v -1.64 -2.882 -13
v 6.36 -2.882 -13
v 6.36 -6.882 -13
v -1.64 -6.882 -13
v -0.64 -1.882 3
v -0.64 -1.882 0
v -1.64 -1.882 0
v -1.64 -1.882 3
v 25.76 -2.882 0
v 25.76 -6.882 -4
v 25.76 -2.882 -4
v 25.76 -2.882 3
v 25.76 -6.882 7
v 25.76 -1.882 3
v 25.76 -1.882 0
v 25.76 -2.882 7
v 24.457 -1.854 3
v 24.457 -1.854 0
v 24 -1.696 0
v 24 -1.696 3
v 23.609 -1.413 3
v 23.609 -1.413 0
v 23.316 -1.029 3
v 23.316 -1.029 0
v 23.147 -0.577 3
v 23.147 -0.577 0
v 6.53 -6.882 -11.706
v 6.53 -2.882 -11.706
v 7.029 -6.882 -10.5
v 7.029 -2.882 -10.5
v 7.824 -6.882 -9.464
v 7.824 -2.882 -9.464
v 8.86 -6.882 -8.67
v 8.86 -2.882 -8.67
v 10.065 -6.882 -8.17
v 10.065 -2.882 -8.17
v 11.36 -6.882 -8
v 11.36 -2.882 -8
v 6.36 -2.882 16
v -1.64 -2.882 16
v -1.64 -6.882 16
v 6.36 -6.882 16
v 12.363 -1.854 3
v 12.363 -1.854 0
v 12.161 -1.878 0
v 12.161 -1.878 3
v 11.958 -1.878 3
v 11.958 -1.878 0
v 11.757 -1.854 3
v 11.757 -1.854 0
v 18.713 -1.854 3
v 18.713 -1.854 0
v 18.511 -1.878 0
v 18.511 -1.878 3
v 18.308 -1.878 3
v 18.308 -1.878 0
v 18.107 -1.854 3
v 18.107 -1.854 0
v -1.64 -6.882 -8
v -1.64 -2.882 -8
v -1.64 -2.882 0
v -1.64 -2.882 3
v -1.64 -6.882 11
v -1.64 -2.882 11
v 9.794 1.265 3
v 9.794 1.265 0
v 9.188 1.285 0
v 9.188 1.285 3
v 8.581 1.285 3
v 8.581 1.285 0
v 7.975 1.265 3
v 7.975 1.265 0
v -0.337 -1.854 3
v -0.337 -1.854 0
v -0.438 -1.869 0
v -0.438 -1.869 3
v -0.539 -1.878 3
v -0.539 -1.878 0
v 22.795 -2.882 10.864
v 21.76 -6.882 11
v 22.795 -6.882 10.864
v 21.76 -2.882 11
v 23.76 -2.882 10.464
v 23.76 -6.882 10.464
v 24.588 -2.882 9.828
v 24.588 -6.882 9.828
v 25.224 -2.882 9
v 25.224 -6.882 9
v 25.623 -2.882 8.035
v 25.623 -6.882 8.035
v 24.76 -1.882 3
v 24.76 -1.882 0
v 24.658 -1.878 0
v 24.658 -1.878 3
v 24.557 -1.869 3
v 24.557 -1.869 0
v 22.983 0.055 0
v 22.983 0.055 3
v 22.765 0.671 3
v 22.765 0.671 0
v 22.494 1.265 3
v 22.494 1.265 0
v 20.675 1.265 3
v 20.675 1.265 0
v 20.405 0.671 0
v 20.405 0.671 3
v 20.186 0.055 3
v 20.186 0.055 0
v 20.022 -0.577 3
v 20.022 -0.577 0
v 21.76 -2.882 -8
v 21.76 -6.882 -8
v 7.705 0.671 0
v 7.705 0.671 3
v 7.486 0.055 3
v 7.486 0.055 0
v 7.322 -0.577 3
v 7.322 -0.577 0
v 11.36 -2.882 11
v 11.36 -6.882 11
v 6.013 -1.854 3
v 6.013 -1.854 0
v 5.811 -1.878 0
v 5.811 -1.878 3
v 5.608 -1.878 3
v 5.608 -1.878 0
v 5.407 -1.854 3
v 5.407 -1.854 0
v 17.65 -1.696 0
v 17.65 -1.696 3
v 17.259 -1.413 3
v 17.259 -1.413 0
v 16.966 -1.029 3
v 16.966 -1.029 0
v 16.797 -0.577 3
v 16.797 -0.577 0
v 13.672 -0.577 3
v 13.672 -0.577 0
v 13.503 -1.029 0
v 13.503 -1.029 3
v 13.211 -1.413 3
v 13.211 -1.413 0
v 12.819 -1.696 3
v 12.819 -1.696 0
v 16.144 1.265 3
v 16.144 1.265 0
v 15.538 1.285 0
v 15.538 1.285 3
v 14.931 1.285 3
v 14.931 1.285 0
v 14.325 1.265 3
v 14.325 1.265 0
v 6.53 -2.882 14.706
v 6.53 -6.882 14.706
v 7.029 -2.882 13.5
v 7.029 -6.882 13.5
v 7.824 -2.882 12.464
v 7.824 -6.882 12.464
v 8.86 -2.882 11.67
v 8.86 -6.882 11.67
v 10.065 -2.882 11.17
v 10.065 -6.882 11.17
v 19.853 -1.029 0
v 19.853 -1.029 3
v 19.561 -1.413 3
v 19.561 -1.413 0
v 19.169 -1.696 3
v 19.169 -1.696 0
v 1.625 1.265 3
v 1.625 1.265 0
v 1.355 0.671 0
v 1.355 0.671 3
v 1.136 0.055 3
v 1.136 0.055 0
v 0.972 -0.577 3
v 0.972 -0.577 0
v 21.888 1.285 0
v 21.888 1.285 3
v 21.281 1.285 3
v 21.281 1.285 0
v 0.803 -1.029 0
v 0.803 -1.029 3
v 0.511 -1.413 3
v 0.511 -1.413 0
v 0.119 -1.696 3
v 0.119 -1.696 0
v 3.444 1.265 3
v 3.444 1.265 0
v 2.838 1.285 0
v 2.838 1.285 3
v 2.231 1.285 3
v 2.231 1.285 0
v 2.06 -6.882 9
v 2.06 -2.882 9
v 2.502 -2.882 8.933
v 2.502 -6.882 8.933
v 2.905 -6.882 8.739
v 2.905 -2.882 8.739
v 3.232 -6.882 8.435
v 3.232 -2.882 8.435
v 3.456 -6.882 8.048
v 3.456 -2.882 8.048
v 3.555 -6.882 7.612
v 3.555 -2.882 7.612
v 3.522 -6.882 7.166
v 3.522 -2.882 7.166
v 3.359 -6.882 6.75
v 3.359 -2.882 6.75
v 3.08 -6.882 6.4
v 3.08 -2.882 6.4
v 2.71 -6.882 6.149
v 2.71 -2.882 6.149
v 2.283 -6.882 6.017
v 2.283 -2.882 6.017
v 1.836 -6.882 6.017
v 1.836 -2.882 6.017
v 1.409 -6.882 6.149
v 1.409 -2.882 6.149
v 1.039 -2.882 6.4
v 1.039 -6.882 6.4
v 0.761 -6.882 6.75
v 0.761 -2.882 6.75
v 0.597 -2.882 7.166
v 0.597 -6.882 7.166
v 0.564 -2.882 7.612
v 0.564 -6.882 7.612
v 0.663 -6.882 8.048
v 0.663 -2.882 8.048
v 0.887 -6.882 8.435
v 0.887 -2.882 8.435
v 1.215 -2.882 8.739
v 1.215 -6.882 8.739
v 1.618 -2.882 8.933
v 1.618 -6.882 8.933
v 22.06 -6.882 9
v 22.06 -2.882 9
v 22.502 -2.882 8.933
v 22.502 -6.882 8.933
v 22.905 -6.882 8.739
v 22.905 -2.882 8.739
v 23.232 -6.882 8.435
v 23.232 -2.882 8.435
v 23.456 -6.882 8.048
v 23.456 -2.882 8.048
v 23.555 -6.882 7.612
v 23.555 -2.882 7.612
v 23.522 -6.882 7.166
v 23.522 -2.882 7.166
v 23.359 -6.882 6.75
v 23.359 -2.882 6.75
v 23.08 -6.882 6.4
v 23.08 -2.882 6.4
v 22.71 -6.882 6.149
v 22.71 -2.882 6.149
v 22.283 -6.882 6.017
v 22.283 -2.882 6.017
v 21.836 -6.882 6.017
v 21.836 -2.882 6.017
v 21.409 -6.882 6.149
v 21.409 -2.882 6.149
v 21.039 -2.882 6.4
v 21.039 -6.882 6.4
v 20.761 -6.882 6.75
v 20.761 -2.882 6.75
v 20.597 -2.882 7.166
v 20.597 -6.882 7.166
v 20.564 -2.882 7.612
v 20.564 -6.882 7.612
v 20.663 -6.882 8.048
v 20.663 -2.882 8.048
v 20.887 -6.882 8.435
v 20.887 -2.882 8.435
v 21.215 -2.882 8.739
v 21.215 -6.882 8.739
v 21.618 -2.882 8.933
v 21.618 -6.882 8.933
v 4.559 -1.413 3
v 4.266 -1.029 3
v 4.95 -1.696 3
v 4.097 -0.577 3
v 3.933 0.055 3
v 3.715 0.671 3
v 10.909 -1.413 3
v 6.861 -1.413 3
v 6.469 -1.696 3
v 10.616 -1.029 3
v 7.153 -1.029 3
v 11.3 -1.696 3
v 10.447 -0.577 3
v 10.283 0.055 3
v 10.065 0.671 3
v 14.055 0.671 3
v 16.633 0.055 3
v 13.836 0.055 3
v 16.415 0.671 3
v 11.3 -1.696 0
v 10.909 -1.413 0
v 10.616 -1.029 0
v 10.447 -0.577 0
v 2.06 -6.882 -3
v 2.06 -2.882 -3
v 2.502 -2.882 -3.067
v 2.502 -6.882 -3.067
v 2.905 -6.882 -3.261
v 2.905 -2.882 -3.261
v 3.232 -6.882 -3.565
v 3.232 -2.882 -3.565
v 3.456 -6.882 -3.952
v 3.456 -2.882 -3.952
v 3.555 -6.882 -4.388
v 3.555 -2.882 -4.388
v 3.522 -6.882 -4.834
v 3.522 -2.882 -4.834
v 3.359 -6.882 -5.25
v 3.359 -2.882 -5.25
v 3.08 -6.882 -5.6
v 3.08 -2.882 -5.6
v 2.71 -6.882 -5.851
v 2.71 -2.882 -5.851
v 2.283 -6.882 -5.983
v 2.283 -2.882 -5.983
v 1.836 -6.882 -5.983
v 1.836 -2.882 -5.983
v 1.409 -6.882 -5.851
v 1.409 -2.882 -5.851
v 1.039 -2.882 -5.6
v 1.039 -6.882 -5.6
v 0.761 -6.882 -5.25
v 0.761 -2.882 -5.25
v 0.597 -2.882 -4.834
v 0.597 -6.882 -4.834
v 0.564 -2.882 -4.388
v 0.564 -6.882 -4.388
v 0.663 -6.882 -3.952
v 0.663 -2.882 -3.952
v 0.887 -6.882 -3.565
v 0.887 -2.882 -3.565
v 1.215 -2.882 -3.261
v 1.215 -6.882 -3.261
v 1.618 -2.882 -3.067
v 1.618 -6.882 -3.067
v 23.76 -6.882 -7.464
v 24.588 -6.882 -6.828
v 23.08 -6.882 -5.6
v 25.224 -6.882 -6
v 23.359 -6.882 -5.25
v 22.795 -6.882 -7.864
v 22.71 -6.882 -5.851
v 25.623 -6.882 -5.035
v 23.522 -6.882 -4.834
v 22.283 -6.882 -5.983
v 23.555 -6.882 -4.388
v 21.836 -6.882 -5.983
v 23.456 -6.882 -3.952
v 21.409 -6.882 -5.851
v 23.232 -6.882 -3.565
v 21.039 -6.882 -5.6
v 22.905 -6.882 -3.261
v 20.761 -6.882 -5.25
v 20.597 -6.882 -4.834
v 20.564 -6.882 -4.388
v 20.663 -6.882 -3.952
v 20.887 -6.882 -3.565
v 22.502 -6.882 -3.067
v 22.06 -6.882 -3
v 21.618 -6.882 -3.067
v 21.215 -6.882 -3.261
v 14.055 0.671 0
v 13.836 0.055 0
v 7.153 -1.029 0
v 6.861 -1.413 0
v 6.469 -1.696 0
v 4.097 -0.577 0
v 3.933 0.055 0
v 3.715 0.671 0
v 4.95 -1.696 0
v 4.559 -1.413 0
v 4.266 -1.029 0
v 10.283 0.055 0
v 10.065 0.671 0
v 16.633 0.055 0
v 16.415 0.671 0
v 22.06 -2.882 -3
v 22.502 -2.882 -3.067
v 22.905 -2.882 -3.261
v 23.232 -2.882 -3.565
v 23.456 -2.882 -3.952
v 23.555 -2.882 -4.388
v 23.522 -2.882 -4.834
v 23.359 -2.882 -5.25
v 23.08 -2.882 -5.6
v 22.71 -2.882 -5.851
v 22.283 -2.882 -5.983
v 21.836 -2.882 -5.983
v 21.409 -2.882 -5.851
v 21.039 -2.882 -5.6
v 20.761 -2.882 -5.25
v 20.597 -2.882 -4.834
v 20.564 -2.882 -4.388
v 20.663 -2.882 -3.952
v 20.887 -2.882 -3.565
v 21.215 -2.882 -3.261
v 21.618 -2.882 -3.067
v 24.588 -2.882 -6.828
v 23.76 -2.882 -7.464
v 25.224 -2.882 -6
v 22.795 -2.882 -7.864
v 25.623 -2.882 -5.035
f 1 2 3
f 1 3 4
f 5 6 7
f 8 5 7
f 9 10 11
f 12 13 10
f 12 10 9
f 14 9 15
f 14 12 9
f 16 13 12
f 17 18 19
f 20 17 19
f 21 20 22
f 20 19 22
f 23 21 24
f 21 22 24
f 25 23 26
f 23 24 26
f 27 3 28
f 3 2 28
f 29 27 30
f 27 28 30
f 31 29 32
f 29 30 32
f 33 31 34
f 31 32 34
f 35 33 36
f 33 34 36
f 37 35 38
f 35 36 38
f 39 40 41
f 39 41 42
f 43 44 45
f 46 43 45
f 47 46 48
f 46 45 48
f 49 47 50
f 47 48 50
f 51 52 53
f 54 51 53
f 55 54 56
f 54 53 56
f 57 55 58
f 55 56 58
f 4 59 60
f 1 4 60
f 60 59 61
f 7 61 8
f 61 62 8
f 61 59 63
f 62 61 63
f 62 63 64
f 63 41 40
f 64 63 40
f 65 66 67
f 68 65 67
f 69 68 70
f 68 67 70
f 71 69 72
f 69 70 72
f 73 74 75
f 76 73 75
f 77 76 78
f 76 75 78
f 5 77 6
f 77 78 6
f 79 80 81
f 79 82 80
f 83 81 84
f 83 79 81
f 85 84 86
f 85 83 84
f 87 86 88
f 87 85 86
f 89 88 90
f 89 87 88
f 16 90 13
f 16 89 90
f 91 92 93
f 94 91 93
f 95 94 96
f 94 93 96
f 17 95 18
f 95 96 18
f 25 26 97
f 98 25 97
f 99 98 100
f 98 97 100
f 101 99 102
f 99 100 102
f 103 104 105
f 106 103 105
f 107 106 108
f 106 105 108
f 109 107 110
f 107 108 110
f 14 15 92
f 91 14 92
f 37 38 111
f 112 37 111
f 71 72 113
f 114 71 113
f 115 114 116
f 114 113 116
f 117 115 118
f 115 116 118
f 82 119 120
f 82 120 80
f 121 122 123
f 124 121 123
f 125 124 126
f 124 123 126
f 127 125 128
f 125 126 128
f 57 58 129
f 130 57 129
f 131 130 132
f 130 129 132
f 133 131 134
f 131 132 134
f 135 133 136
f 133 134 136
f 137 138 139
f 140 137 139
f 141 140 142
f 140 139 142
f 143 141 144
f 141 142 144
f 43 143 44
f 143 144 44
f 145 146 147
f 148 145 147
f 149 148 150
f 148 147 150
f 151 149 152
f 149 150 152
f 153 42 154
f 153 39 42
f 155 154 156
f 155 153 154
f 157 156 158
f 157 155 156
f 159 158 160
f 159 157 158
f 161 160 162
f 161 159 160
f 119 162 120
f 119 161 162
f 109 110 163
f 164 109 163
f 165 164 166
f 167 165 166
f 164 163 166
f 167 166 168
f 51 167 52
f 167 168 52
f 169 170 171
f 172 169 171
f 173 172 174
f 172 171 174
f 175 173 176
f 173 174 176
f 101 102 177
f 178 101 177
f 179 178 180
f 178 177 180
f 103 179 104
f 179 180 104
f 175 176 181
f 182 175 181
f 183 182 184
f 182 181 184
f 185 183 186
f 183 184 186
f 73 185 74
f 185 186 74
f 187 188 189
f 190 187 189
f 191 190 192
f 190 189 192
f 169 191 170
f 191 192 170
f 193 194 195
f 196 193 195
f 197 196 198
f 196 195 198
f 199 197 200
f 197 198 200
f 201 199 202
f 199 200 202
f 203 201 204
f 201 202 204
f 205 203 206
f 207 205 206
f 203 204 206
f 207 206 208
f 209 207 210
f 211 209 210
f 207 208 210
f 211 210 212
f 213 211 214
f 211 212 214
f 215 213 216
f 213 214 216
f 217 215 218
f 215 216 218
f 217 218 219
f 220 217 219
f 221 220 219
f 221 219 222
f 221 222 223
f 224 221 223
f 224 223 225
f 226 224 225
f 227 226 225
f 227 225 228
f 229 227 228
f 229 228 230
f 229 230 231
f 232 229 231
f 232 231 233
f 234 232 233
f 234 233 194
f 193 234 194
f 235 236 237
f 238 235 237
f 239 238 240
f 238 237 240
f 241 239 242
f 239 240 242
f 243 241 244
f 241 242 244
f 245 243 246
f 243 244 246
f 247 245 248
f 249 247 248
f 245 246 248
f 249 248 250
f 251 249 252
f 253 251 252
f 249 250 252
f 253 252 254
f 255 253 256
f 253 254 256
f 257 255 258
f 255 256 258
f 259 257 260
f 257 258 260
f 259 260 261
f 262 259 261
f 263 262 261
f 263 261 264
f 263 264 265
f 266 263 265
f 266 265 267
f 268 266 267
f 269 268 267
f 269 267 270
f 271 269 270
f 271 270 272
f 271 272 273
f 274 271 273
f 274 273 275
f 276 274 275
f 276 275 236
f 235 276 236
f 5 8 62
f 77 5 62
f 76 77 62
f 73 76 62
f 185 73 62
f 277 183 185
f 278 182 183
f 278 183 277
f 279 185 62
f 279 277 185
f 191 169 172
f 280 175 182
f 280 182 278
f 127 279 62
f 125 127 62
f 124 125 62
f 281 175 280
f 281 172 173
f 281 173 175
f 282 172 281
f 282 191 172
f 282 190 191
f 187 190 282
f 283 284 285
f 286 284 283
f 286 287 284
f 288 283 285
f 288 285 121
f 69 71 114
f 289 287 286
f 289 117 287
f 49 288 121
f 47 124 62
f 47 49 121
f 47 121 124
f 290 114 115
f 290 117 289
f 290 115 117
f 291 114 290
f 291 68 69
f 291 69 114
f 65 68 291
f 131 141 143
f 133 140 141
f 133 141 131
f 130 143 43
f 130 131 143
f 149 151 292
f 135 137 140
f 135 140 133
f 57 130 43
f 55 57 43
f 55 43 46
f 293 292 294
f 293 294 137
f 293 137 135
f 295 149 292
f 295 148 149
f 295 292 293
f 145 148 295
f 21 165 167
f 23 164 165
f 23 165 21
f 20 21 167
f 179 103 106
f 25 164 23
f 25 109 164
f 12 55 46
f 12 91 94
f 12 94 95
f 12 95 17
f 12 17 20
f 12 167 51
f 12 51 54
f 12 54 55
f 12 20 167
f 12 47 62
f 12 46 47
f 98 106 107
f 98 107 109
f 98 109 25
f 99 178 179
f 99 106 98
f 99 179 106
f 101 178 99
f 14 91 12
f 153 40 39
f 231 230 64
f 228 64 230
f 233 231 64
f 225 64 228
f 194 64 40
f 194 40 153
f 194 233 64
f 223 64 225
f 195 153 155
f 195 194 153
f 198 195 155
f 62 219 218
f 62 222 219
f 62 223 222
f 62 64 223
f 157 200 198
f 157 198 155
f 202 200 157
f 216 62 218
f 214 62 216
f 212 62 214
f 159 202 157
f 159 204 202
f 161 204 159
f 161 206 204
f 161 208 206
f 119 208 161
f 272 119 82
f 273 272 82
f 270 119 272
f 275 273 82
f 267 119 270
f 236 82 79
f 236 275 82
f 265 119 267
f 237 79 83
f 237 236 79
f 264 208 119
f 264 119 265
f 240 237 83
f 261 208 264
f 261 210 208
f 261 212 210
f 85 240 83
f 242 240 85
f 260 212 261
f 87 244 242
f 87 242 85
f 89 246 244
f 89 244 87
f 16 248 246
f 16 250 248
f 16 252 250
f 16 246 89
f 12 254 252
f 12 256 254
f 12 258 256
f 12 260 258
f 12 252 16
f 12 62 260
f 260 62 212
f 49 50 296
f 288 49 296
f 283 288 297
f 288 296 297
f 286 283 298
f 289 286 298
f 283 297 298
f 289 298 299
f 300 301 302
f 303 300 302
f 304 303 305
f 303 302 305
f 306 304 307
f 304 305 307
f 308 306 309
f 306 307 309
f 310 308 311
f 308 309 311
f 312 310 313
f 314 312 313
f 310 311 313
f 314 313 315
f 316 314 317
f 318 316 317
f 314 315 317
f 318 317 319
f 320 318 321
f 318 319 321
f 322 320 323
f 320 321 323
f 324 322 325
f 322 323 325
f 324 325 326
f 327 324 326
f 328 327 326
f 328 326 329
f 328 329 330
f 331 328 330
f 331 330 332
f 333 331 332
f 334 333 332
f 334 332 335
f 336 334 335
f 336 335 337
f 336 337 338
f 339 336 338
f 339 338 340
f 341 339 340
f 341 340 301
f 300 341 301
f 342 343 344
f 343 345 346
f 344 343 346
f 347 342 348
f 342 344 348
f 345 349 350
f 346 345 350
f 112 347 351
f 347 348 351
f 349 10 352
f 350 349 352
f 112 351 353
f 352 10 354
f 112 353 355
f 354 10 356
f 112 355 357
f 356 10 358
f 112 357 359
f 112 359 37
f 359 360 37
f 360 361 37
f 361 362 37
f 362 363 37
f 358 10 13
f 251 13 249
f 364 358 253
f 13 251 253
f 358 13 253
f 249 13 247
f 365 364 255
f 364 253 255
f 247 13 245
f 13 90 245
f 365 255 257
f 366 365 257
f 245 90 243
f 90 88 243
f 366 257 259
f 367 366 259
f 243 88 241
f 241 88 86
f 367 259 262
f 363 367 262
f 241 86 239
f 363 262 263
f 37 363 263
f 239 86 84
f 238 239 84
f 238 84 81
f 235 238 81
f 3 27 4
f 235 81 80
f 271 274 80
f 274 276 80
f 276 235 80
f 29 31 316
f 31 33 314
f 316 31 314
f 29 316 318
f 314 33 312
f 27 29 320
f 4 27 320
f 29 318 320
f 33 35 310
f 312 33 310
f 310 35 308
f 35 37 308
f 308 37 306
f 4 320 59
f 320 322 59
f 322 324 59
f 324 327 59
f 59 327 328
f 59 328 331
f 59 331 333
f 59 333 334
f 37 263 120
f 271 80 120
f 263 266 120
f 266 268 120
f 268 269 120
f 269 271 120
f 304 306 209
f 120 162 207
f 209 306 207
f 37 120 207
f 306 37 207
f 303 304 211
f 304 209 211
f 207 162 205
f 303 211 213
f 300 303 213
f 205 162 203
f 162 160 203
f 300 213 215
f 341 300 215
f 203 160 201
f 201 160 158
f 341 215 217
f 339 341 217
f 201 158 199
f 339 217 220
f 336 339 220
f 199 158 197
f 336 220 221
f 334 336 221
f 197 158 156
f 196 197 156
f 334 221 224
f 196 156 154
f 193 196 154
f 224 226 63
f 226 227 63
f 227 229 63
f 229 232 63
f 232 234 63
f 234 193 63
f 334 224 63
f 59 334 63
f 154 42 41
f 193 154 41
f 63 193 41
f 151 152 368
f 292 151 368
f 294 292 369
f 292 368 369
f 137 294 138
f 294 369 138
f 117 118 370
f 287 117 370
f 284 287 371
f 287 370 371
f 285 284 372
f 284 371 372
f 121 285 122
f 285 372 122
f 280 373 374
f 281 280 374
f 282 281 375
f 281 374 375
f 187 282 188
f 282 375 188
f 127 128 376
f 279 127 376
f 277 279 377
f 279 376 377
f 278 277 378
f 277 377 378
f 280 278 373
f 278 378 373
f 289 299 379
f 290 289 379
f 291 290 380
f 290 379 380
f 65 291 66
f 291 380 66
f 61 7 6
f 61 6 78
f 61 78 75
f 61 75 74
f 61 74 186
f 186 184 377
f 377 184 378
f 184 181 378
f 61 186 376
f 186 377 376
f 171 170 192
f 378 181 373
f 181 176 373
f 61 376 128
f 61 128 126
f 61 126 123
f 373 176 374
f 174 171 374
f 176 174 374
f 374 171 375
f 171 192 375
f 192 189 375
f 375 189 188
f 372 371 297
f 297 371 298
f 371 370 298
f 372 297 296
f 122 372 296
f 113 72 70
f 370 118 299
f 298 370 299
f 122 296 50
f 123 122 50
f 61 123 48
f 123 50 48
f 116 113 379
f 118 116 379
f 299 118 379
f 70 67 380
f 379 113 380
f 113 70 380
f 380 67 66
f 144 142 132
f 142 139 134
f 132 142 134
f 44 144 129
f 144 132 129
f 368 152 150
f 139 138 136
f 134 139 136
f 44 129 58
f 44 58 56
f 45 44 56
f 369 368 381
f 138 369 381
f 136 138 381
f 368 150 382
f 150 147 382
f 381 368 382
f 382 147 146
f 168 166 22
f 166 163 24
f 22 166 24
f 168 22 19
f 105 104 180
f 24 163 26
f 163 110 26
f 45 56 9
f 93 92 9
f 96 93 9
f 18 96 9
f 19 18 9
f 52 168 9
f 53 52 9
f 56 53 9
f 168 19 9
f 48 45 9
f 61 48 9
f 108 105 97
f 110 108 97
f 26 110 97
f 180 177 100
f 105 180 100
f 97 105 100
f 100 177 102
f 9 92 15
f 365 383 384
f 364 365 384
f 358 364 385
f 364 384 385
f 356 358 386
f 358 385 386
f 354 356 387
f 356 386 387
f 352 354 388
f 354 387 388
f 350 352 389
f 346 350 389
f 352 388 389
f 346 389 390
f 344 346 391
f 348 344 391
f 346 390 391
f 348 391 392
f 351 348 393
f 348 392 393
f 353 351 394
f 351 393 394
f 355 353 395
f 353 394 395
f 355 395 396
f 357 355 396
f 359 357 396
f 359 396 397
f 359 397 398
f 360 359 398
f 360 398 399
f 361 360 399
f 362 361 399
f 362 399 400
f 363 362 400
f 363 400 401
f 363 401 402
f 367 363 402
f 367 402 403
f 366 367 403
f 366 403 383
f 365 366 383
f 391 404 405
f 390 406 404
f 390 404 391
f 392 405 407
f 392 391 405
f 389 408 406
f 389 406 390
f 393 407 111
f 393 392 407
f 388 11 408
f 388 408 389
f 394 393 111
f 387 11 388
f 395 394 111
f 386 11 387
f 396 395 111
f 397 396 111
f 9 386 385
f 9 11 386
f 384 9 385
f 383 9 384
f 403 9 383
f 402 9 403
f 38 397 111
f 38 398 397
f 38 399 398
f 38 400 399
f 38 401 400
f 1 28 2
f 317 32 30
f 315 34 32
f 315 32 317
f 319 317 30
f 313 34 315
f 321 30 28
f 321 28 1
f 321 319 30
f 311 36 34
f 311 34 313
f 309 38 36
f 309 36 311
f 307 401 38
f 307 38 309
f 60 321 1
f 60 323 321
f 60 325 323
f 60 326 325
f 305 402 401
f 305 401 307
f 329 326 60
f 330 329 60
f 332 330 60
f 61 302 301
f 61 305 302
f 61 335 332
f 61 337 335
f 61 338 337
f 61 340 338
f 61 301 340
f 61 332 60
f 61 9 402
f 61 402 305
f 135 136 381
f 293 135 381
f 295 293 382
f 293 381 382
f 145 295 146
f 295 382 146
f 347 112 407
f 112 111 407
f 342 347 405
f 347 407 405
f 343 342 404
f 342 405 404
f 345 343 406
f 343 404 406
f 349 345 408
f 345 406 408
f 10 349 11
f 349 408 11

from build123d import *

# Parameters (mm, degrees)
SKETCH_1_W          = 27.399999997
SKETCH_1_H          = 4
EXTRUDE_1_DEPTH     = 3
SKETCH_1_3_W        = 27.399999997
SKETCH_1_3_H        = 4
EXTRUDE_2_DEPTH     = 11
SKETCH_1_4_W        = 27.399999997
SKETCH_1_4_H        = 4
EXTRUDE_3_DEPTH     = 8
SKETCH_2_R          = 1.5
CUT_EXTRUDE_1_DEPTH = 6.5
FILLET_1_R          = 4
EXTRUDE_4_DEPTH     = 19
SKETCH_6_W          = 32.257266432
SKETCH_6_H          = 23.708854684
CUT_EXTRUDE_2_DEPTH = 21
SKETCH_7_W          = 8
SKETCH_7_H          = 4
EXTRUDE_5_DEPTH     = 5
SKETCH_8_W          = 8
SKETCH_8_H          = 4
EXTRUDE_6_DEPTH     = 5
FILLET_2_R          = 5


with BuildPart() as part:
    # 草图1 → 凸台-拉伸1 (new body)
    with BuildSketch(Plane.XY):
        with BuildLine():
            ThreePointArc((-0.337371922, -1.853501365), (-0.488220409, -1.87454383), (-0.640366957, -1.881577989))
            Line((-0.640366957, -1.881577989), (-1.640366957, -1.881577989))
            Line((-1.640366957, -1.881577989), (-1.640366957, -2.881577989))
            Line((-1.640366957, -2.881577989), (25.75963304, -2.881577989))
            Line((25.75963304, -2.881577989), (25.75963304, -1.88157799))
            Line((25.75963304, -1.88157799), (24.75963304, -1.88157799))
            ThreePointArc((24.75963304, -1.88157799), (24.607486492, -1.87454383), (24.456638005, -1.853501365))
            ThreePointArc((24.456638005, -1.853501365), (23.608703525, -1.413476758), (23.147062635, -0.577114262))
            ThreePointArc((23.147062635, -0.577114262), (22.880535784, 0.365382964), (22.493851477, 1.265278974))
            ThreePointArc((22.493851477, 1.265278974), (21.584633042, 1.287629087), (20.675414607, 1.265278974))
            ThreePointArc((20.675414607, 1.265278974), (20.288730299, 0.365382964), (20.022203448, -0.577114261))
            ThreePointArc((20.022203448, -0.577114261), (19.560562558, -1.413476758), (18.712628078, -1.853501365))
            ThreePointArc((18.712628078, -1.853501365), (18.409633042, -1.88157799), (18.106638005, -1.853501365))
            ThreePointArc((18.106638005, -1.853501365), (17.258703525, -1.413476758), (16.797062635, -0.577114262))
            ThreePointArc((16.797062635, -0.577114262), (16.530535784, 0.365382964), (16.143851477, 1.265278974))
            ThreePointArc((16.143851477, 1.265278974), (15.234633042, 1.287629087), (14.325414607, 1.265278974))
            ThreePointArc((14.325414607, 1.265278974), (13.938730299, 0.365382964), (13.672203448, -0.577114261))
            ThreePointArc((13.672203448, -0.577114261), (13.210562558, -1.413476758), (12.362628078, -1.853501365))
            ThreePointArc((12.362628078, -1.853501365), (12.059633042, -1.88157799), (11.756638005, -1.853501365))
            ThreePointArc((11.756638005, -1.853501365), (10.908703525, -1.413476758), (10.447062635, -0.577114262))
            ThreePointArc((10.447062635, -0.577114262), (10.180535784, 0.365382964), (9.793851477, 1.265278974))
            ThreePointArc((9.793851477, 1.265278974), (8.884633042, 1.287629087), (7.975414607, 1.265278974))
            ThreePointArc((7.975414607, 1.265278974), (7.588730299, 0.365382964), (7.322203448, -0.577114261))
            ThreePointArc((7.322203448, -0.577114261), (6.860562558, -1.413476758), (6.012628078, -1.853501365))
            ThreePointArc((6.012628078, -1.853501365), (5.709633042, -1.88157799), (5.406638005, -1.853501365))
            ThreePointArc((5.406638005, -1.853501365), (4.558703525, -1.413476758), (4.097062635, -0.577114262))
            ThreePointArc((4.097062635, -0.577114262), (3.830535784, 0.365382964), (3.443851477, 1.265278974))
            ThreePointArc((3.443851477, 1.265278974), (2.534633042, 1.287629087), (1.625414607, 1.265278974))
            ThreePointArc((1.625414607, 1.265278974), (1.238730299, 0.365382964), (0.972203448, -0.577114261))
            ThreePointArc((0.972203448, -0.577114261), (0.510562558, -1.413476758), (-0.337371922, -1.853501365))
        make_face()
        with Locations((12.059633041, -4.881577989)):
            Rectangle(SKETCH_1_W, SKETCH_1_H)
    extrude(amount=EXTRUDE_1_DEPTH)

    # 草图1<3> → 凸台-拉伸2 (add)
    with BuildSketch(Plane.XY):
        with Locations((12.059633041, -4.881577989)):
            Rectangle(SKETCH_1_3_W, SKETCH_1_3_H)
    extrude(amount=EXTRUDE_2_DEPTH)

    # 草图1<4> → 凸台-拉伸3 (add)
    with BuildSketch(Plane.XY):
        with Locations((12.059633041, -4.881577989)):
            Rectangle(SKETCH_1_4_W, SKETCH_1_4_H)
    extrude(amount=-EXTRUDE_3_DEPTH)

    # 草图2 → 切除-拉伸1 (cut)
    with BuildSketch(Plane(origin=(0, -2.881577989, 0), x_dir=(1, 0, 0), z_dir=(0, 1, 0))):
        with Locations(Location((2.059633042, 4.5, 0), (0, 0, 270))):
            Circle(SKETCH_2_R)
        with Locations(Location((22.059633042, 4.5, 0), (0, 0, 270))):
            Circle(SKETCH_2_R)
        with Locations(Location((22.059633042, -7.5, 0), (0, 0, 270))):
            Circle(SKETCH_2_R)
        with Locations(Location((2.059633042, -7.5, 0), (0, 0, 270))):
            Circle(SKETCH_2_R)
    extrude(amount=-CUT_EXTRUDE_1_DEPTH, mode=Mode.SUBTRACT)

    # 圆角1
    fillet_1_edges = [part.edges().sort_by_distance(p)[0] for p in [
        (25.75963304, -4.881577989, 11),
        (25.75963304, -4.881577989, -8),
    ]]
    fillet(fillet_1_edges, radius=FILLET_1_R)

    # 草图4 → 凸台-拉伸4 (add)
    with BuildSketch(Plane(origin=(0, 0, -8), x_dir=(-1, 0, 0), z_dir=(0, 0, -1))):
        with BuildLine():
            Line((-7.559633042, -6.881577989), (-12.559633042, -6.881577989))
            Line((-12.559633042, -6.881577989), (-12.559633042, -12.881577989))
            ThreePointArc((-12.559633042, -12.881577989), (-9.530706272, -19.615542978), (-2.482680937, -21.816910897))
            Line((-2.482680937, -21.816910897), (-2.482680937, -19.612245623))
            ThreePointArc((-2.482680937, -19.612245623), (-6.148073578, -17.096946581), (-7.559633042, -12.881577989))
            Line((-7.559633042, -12.881577989), (-7.559633042, -6.881577989))
        make_face()
    extrude(amount=-EXTRUDE_4_DEPTH)

    # 草图6 → 切除-拉伸2 (cut)
    with BuildSketch(Plane.XZ.offset(6.881577989)):
        with Locations((13.405653676, 0.508195322)):
            Rectangle(SKETCH_6_W, SKETCH_6_H)
    extrude(amount=CUT_EXTRUDE_2_DEPTH, mode=Mode.SUBTRACT)

    # 草图7 → 凸台-拉伸5 (add)
    with BuildSketch(Plane.XY.offset(11)):
        with Locations((2.359633043, -4.881577989)):
            Rectangle(SKETCH_7_W, SKETCH_7_H)
    extrude(amount=EXTRUDE_5_DEPTH)

    # 草图8 → 凸台-拉伸6 (add)
    with BuildSketch(Plane(origin=(0, 0, -8), x_dir=(-1, 0, 0), z_dir=(0, 0, -1))):
        with Locations((-2.359633043, -4.881577989)):
            Rectangle(SKETCH_8_W, SKETCH_8_H)
    extrude(amount=EXTRUDE_6_DEPTH)

    # 圆角2
    fillet_2_edges = [part.edges().sort_by_distance(p)[0] for p in [
        (6.359633043, -4.881577989, 11),
        (6.359633043, -4.881577989, -8),
    ]]
    fillet(fillet_2_edges, radius=FILLET_2_R - 0.0001)  # a hair under: the kernel refuses the full size


solid = part.part
